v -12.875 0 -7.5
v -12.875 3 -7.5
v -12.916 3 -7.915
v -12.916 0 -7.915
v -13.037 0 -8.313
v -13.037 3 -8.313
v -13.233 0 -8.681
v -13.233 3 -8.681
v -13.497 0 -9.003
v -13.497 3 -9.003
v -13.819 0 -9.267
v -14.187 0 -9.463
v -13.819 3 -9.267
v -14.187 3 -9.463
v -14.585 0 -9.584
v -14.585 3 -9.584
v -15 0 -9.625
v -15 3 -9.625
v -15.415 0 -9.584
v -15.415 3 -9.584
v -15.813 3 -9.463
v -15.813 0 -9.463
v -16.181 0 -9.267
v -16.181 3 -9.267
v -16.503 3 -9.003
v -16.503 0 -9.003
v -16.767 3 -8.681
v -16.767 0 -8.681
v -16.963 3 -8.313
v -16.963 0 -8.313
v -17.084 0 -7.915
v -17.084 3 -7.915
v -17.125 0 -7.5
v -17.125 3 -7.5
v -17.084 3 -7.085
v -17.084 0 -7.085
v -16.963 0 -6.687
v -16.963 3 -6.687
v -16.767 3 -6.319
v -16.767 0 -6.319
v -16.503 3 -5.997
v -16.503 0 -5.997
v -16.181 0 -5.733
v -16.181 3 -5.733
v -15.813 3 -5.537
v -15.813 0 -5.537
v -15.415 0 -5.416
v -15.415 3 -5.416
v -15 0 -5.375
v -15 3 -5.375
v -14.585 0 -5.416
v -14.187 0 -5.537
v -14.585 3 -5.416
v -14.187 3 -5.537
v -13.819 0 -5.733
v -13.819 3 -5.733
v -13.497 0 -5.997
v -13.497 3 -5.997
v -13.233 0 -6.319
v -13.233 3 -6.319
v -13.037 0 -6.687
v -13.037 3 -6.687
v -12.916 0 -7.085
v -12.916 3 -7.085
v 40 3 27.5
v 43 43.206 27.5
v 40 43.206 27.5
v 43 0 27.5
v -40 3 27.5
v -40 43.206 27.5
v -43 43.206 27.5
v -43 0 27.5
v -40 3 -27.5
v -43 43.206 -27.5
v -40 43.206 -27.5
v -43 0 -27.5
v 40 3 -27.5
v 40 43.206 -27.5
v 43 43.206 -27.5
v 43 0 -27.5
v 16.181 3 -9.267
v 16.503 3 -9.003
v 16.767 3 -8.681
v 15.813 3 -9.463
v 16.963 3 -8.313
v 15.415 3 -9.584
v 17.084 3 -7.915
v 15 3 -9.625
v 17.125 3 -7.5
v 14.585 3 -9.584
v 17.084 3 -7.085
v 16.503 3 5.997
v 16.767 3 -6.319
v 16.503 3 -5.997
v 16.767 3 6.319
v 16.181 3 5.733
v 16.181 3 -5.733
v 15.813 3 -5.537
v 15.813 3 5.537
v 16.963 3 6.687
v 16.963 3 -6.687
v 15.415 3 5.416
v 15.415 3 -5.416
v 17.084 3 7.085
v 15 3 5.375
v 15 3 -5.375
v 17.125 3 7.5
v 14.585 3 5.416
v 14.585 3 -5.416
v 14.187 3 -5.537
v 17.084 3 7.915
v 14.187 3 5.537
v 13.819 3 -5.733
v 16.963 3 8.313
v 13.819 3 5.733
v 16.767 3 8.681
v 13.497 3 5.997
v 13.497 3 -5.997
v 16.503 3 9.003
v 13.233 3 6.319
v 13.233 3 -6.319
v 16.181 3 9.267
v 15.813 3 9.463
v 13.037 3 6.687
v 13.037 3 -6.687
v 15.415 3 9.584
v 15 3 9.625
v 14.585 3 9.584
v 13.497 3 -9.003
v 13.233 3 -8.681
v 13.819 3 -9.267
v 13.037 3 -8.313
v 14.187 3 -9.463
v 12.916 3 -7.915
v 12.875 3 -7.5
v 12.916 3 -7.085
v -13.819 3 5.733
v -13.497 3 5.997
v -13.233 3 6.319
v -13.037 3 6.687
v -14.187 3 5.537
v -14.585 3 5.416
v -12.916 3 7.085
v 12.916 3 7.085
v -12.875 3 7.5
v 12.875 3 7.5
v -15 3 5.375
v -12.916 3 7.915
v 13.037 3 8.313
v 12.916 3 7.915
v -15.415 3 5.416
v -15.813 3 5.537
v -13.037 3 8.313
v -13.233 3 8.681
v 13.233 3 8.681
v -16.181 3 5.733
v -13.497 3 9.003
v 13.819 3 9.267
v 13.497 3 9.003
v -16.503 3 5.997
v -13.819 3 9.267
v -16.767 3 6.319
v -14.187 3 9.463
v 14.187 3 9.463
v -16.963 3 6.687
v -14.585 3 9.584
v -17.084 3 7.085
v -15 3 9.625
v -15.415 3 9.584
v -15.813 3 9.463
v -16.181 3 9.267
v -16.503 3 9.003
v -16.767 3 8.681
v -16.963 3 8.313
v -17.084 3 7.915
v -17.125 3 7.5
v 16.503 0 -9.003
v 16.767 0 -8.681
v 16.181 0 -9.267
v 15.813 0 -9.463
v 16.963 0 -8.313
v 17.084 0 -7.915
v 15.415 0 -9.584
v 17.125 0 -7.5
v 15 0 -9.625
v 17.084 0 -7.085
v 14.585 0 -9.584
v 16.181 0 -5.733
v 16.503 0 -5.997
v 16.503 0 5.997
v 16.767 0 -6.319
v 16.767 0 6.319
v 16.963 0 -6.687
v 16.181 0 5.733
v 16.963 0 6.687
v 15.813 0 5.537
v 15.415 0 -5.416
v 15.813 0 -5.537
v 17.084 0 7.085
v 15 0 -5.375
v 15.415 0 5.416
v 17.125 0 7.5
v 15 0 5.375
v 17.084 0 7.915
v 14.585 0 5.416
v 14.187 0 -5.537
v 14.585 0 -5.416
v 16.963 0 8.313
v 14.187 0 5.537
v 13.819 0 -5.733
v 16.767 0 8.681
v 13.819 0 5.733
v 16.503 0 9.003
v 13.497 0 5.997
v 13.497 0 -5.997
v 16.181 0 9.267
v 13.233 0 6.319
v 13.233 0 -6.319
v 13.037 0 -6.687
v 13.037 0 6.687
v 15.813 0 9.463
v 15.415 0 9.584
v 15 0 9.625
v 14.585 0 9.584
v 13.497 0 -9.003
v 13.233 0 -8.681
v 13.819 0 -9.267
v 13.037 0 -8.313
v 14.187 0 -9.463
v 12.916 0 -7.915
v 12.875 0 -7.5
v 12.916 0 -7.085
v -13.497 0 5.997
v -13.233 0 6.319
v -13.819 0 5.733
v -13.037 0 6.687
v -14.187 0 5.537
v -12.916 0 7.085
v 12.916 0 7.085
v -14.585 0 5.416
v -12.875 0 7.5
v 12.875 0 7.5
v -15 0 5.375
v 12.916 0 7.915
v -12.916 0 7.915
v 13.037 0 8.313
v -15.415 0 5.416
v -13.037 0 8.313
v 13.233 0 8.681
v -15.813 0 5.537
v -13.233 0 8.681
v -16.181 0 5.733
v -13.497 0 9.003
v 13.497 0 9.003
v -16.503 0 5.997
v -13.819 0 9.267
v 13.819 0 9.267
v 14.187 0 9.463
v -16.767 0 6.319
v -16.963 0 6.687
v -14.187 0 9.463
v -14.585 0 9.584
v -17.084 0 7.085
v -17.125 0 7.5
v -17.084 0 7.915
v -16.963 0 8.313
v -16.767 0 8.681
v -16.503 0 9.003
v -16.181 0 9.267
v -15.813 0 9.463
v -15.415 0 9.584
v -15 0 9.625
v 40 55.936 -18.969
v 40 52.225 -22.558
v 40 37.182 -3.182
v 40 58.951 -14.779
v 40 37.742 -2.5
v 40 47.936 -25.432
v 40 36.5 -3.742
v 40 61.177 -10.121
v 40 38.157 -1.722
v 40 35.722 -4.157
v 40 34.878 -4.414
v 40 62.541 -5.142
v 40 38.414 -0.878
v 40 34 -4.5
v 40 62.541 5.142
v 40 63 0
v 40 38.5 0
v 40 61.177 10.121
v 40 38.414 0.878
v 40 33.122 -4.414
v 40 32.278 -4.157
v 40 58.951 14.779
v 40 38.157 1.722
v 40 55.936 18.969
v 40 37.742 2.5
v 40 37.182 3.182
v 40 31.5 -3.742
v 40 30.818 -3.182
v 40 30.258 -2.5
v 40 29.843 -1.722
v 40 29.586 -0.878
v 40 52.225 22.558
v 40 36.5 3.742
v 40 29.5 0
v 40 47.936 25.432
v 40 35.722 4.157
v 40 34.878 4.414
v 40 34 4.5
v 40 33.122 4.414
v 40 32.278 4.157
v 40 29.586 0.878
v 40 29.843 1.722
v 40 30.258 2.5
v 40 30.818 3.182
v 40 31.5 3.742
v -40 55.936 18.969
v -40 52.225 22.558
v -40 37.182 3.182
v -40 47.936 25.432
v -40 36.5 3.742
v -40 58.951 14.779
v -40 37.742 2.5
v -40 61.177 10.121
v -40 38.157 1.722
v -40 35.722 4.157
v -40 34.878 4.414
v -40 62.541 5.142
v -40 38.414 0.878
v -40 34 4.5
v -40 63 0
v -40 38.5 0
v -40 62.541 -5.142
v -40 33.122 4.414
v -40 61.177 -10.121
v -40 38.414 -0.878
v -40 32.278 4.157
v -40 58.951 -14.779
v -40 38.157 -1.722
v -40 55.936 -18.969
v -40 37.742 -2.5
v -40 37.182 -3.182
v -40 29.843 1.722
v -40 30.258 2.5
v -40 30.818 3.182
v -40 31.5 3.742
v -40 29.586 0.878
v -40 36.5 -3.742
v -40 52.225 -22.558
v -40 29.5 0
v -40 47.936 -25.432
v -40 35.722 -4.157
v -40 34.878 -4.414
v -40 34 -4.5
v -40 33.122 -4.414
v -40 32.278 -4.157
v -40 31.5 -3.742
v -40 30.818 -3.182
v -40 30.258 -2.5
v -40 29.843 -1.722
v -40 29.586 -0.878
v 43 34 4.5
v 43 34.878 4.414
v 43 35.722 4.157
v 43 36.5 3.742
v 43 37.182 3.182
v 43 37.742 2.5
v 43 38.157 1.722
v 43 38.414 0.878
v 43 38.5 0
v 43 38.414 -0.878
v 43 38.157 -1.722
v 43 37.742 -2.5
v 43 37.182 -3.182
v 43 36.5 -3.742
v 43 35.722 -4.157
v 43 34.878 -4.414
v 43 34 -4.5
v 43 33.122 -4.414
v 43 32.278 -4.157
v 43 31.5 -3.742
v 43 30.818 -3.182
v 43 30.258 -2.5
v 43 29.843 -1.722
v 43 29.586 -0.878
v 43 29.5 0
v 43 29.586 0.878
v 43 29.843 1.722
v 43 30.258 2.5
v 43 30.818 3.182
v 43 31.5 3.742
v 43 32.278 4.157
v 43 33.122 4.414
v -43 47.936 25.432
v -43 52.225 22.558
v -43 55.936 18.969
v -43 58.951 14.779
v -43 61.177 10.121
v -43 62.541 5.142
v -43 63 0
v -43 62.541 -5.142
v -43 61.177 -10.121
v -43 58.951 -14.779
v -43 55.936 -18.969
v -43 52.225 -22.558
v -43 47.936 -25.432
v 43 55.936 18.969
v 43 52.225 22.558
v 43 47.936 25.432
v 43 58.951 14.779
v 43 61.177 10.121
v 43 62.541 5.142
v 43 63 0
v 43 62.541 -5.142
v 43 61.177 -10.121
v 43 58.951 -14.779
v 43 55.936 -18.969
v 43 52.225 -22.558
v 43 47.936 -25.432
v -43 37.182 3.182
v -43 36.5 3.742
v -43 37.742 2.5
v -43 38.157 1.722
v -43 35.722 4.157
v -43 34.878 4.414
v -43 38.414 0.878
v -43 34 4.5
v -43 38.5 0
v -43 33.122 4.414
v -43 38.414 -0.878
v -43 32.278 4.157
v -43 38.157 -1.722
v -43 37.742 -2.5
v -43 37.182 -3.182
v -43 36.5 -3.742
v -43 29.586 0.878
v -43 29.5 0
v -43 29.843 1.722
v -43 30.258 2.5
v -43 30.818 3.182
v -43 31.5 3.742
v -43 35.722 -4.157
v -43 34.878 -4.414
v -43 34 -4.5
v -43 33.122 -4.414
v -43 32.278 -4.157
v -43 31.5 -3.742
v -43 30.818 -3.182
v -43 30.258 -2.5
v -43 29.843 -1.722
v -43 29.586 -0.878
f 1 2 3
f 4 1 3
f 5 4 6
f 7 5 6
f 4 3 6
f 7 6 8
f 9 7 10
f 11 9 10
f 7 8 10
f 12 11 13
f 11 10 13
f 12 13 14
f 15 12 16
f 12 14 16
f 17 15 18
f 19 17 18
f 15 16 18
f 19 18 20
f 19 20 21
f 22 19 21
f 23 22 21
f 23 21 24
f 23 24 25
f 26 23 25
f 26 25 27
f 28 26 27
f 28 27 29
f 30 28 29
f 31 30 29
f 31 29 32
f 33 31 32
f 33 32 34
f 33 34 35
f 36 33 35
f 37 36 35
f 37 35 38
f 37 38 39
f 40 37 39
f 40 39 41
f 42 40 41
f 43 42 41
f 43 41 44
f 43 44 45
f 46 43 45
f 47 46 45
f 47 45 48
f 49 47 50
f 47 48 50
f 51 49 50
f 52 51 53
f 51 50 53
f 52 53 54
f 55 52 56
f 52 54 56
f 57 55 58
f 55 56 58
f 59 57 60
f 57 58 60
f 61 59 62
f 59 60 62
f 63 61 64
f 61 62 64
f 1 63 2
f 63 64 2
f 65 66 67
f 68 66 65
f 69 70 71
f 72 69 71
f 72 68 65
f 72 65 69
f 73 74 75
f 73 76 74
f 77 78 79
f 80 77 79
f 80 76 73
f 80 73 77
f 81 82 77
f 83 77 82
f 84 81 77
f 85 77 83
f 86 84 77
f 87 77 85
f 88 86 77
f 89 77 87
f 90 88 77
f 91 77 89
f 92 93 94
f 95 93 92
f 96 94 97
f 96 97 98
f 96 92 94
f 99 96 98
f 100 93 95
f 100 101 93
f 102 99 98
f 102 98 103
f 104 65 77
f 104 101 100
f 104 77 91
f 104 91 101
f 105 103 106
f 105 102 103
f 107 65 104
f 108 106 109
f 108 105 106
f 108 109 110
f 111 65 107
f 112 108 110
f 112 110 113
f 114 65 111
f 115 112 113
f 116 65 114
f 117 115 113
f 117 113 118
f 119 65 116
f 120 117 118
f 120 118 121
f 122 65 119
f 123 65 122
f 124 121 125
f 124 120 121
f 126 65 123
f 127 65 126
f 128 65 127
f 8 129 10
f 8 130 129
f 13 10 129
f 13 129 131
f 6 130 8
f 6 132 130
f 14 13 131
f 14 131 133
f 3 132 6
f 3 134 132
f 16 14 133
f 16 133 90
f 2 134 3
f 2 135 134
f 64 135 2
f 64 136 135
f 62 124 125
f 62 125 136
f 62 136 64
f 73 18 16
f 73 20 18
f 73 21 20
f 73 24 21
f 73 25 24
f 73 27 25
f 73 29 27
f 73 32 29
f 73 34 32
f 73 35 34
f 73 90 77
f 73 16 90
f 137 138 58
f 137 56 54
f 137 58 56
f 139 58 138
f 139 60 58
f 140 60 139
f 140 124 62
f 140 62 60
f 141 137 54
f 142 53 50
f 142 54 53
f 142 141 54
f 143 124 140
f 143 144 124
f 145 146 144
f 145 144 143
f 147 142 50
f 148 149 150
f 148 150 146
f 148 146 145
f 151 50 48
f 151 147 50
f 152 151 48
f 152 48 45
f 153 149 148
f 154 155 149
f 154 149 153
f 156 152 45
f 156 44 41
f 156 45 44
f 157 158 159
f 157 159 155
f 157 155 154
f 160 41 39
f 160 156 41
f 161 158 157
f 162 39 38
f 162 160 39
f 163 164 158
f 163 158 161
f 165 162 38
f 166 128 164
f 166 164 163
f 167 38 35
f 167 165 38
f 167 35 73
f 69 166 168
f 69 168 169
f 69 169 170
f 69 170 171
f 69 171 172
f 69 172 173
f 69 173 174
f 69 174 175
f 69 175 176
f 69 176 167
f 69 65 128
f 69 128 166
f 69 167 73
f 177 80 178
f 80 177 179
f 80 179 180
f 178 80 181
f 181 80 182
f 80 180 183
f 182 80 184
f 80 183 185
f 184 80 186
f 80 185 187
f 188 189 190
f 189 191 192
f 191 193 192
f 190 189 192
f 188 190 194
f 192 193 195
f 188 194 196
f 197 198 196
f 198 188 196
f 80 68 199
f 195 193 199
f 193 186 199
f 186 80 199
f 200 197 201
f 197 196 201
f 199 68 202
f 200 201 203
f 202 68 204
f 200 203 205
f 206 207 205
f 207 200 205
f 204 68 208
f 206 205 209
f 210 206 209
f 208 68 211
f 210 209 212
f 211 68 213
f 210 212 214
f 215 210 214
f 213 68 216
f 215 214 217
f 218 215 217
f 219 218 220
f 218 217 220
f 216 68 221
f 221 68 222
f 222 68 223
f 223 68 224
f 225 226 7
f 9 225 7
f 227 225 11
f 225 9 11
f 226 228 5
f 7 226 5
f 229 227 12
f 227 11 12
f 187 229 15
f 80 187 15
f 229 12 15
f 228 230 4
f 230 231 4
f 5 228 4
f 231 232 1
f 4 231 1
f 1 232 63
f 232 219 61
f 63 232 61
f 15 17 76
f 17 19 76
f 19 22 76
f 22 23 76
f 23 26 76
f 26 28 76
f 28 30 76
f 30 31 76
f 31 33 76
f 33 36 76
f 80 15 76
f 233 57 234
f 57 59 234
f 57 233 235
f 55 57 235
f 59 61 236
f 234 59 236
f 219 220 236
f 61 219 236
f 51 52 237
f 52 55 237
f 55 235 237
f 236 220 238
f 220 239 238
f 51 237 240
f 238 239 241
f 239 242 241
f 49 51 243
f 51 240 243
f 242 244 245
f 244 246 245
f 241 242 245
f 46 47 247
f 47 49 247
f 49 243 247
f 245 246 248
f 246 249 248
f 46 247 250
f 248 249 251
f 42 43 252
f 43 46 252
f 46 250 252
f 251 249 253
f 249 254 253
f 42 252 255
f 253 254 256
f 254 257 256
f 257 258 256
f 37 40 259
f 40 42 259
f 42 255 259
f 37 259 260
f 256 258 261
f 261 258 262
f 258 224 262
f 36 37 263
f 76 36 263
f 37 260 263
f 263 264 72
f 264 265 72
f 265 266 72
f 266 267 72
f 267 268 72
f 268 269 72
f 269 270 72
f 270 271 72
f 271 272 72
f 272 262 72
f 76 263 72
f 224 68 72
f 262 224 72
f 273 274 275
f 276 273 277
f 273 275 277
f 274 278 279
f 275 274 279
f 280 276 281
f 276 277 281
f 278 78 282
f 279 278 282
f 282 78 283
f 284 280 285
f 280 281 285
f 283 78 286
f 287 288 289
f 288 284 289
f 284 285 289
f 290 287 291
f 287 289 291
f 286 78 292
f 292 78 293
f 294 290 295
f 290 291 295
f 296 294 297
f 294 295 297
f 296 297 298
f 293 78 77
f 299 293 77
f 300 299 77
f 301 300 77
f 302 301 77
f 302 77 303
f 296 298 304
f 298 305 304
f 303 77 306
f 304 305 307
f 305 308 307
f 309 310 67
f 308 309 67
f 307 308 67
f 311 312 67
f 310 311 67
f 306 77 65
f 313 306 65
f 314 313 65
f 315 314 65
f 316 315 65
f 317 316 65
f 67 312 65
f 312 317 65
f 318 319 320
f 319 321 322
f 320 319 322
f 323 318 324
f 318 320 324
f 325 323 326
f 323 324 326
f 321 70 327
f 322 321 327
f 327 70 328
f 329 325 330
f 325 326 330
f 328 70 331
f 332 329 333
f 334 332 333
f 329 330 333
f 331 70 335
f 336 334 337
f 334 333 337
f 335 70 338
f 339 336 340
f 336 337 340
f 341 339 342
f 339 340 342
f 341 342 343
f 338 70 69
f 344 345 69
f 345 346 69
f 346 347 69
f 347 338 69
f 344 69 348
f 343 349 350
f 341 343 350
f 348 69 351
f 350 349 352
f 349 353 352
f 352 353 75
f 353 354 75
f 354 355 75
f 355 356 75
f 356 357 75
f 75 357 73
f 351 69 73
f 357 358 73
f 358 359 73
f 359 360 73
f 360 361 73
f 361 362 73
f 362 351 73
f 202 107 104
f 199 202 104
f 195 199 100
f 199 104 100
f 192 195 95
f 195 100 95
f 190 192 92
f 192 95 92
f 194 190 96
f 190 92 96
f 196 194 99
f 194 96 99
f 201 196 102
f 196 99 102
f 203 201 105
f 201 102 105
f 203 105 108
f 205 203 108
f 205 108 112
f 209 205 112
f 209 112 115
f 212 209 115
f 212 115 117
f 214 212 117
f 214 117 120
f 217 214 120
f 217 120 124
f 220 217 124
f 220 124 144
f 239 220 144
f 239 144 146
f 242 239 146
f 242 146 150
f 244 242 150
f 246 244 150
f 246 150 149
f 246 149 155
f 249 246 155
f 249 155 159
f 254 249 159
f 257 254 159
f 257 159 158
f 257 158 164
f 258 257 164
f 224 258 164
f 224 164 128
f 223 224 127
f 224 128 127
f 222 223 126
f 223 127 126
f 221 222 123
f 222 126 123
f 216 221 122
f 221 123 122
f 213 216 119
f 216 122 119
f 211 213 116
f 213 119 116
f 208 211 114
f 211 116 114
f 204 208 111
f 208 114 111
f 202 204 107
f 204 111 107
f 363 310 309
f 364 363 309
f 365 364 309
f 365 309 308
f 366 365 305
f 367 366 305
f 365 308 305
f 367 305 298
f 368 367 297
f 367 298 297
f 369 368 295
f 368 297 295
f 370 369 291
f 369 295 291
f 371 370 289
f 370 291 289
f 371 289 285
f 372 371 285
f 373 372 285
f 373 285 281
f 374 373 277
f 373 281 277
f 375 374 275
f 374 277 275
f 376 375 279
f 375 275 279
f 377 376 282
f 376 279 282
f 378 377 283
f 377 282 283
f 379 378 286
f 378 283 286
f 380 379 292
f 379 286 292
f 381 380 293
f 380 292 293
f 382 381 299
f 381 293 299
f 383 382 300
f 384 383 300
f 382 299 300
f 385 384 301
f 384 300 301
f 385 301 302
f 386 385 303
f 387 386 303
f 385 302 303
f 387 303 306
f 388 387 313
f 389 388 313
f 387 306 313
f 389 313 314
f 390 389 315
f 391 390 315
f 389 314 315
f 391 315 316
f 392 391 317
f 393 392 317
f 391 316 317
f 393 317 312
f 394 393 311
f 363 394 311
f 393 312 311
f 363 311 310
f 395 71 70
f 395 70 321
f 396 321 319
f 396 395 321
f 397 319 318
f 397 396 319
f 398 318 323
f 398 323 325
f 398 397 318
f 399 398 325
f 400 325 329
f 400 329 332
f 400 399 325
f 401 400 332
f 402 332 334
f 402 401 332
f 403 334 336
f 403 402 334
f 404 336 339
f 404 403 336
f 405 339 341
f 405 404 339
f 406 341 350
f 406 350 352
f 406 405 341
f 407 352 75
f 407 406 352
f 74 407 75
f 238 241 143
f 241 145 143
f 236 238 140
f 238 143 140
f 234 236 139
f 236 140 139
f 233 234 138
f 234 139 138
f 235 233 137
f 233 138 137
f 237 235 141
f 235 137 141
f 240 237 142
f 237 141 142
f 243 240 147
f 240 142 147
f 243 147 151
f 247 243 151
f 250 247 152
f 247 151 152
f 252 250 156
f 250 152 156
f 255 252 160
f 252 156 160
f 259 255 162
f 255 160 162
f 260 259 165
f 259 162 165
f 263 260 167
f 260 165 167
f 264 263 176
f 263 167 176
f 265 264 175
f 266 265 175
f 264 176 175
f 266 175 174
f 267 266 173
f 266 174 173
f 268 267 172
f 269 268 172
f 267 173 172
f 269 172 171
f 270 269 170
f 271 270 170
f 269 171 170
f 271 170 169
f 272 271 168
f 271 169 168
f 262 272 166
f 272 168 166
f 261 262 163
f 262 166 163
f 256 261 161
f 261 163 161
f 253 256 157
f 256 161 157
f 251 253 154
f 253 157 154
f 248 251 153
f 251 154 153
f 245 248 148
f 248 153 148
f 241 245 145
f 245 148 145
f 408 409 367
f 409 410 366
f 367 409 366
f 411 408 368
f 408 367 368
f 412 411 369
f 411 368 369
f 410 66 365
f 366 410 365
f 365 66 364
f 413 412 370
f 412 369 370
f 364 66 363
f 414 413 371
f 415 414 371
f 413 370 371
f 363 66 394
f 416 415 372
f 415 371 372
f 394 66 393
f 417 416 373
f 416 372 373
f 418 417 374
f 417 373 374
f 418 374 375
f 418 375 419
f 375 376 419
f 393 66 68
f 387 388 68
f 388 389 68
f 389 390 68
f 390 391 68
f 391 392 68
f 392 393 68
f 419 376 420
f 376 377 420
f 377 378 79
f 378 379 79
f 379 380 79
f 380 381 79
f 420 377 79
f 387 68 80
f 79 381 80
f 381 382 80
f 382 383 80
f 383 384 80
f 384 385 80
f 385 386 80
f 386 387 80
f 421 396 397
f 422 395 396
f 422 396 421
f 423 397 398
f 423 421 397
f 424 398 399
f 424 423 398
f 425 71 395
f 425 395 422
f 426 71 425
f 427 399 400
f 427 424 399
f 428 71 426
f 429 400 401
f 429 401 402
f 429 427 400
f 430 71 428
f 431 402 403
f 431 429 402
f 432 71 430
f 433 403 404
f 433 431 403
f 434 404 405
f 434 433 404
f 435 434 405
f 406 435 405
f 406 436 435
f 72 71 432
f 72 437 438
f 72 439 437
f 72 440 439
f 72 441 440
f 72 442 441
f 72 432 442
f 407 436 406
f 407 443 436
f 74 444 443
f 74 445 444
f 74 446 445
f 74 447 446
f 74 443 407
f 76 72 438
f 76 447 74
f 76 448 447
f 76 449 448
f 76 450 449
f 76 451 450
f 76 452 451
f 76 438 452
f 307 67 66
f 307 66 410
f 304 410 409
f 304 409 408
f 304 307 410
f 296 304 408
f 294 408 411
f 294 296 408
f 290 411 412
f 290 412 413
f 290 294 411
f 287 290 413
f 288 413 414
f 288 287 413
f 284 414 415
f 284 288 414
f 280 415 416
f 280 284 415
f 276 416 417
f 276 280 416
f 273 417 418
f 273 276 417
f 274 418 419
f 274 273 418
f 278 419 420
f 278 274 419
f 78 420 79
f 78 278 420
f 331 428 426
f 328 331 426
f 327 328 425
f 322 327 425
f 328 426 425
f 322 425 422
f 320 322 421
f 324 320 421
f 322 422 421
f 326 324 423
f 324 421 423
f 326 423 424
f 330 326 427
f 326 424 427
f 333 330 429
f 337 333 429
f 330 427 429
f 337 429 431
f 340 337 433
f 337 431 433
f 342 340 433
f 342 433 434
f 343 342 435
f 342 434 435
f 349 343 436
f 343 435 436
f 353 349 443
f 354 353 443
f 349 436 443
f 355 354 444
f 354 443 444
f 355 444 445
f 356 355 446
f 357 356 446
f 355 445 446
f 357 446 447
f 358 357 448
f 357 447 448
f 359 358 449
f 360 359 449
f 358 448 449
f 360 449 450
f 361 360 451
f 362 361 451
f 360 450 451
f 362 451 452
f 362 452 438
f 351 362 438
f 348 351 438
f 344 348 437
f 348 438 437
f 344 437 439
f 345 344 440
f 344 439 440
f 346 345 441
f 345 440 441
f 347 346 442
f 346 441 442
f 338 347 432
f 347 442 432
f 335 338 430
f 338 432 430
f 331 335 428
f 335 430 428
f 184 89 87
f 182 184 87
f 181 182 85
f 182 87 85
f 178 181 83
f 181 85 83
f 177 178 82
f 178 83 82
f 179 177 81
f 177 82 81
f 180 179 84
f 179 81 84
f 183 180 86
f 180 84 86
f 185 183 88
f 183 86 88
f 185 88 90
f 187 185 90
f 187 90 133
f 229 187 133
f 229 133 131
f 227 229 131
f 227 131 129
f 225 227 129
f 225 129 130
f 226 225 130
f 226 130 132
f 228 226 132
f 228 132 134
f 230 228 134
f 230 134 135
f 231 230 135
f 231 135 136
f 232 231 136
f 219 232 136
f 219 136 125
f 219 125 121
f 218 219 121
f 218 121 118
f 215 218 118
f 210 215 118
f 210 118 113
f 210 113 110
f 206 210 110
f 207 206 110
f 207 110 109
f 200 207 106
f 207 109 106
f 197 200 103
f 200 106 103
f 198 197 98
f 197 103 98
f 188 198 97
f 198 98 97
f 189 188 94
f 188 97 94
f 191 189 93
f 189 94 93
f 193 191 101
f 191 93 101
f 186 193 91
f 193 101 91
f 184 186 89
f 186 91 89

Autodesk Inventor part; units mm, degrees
ref_plane "YZ Plane" through (0, 0, 0) normal (1, 0, 0) x (0, 1, 0)
ref_plane "XZ Plane" through (0, 0, 0) normal (0, 1, 0) x (-1, 0, 0)
ref_plane "XY Plane" through (0, 0, 0) normal (0, 0, 1) x (1, 0, 0)
sketch "Sketch1" plane through (0, 0, 0) normal (0, 1, 0) x (-1, 0, 0)
  line L0 (-40, 27.5) -> (40, 27.5)
  line L1 (40, 27.5) -> (40, -27.5)
  line L2 (40, -27.5) -> (-40, -27.5)
  line L3 (-40, -27.5) -> (-40, 27.5)
  line L4 (-40, 27.5) -> (40, -27.5) construction
  line L5 (40, 27.5) -> (-40, -27.5) construction
  line L6 (40, 27.5) -> (43, 27.5)
  line L7 (43, 27.5) -> (43, -27.5)
  line L8 (43, -27.5) -> (40, -27.5)
  line L9 (40, -27.5) -> (40, 27.5)
  line L10 (-40, 27.5) -> (-43, 27.5)
  line L11 (-43, 27.5) -> (-43, -27.5)
  line L12 (-43, -27.5) -> (-40, -27.5)
  line L13 (-40, -27.5) -> (-40, 27.5)
  point P0 (0, 0)
  point P1 (-40, -27.5)
  dimension "d0" = 80
  dimension "d1" = 55
  dimension "d2" = 3
  dimension "d3" = 3
extrude "Extrusion1" add sketch "Sketch1" along normal blind 3 contours L0 L1 L2 L3
extrude "Extrusion2" add sketch "Sketch1" along normal blind 63 contours L3 L12 L11 L10 | L6 L7 L8 L1
sketch "Sketch2" plane through (0, 3, 0) normal (0, 1, 0) x (1, 0, 0)
  line L0 (12.875, -7.5) -> (-12.875, -7.5)
  line L1 (-12.875, -7.5) -> (-12.875, 7.5)
  line L2 (-12.875, 7.5) -> (12.875, 7.5)
  line L3 (12.875, 7.5) -> (12.875, -7.5)
  line L4 (12.875, -7.5) -> (-12.875, 7.5) construction
  line L5 (-12.875, -7.5) -> (12.875, 7.5) construction
  line L6 (12.875, 7.5) -> (17.125, 7.5)
  circle A0 centre (15, 7.5) radius 2.125
  circle A1 centre (15, -7.5) radius 2.125
  line L7 (-12.875, -7.5) -> (-17.125, -7.5)
  circle A2 centre (-15, -7.5) radius 2.125
  circle A3 centre (-15, 7.5) radius 2.125
  point P0 (0, 0)
  dimension "d8" = 25.75
  dimension "d9" = 15
  dimension "d10" = 4.25
  dimension "d11" = 4.25
extrude "Extrusion3" cut sketch "Sketch2" against normal through all contours A2 L7 | L7 A2 | A3 | A0 L6 | L6 A0 | A1
sketch "Sketch3" plane through (-43, 0, -27.5) normal (-1, 0, 0) x (0, 0, 1)
  circle A0 centre (27.5, 34) radius 4.5
  line L0 (0, 0) -> (55, 0) projected
  circle A1 centre (27.5, 34) radius 29
  line L1 (0, 3) -> (0, 63) projected
  line L2 (0, 43.206) -> (0, 63)
  line L3 (0, 63) -> (27.5, 63)
  line L4 (55, 63) -> (0, 63) projected
  line L5 (27.5, 63) -> (55, 63)
  line L6 (55, 63) -> (55, 43.206)
  line L7 (55, 3) -> (55, 63) projected
  point P0 (27.5, 0)
  dimension "d14" = 9
  dimension "d15" = 34
extrude "Extrusion4" cut sketch "Sketch3" against normal through all contours A0
extrude "Extrusion5" cut sketch "Sketch3" against normal through all contours A1 L4 L6 | A1 L1 L3
properties part number "baseatas2" material "Aluminum 6061"
